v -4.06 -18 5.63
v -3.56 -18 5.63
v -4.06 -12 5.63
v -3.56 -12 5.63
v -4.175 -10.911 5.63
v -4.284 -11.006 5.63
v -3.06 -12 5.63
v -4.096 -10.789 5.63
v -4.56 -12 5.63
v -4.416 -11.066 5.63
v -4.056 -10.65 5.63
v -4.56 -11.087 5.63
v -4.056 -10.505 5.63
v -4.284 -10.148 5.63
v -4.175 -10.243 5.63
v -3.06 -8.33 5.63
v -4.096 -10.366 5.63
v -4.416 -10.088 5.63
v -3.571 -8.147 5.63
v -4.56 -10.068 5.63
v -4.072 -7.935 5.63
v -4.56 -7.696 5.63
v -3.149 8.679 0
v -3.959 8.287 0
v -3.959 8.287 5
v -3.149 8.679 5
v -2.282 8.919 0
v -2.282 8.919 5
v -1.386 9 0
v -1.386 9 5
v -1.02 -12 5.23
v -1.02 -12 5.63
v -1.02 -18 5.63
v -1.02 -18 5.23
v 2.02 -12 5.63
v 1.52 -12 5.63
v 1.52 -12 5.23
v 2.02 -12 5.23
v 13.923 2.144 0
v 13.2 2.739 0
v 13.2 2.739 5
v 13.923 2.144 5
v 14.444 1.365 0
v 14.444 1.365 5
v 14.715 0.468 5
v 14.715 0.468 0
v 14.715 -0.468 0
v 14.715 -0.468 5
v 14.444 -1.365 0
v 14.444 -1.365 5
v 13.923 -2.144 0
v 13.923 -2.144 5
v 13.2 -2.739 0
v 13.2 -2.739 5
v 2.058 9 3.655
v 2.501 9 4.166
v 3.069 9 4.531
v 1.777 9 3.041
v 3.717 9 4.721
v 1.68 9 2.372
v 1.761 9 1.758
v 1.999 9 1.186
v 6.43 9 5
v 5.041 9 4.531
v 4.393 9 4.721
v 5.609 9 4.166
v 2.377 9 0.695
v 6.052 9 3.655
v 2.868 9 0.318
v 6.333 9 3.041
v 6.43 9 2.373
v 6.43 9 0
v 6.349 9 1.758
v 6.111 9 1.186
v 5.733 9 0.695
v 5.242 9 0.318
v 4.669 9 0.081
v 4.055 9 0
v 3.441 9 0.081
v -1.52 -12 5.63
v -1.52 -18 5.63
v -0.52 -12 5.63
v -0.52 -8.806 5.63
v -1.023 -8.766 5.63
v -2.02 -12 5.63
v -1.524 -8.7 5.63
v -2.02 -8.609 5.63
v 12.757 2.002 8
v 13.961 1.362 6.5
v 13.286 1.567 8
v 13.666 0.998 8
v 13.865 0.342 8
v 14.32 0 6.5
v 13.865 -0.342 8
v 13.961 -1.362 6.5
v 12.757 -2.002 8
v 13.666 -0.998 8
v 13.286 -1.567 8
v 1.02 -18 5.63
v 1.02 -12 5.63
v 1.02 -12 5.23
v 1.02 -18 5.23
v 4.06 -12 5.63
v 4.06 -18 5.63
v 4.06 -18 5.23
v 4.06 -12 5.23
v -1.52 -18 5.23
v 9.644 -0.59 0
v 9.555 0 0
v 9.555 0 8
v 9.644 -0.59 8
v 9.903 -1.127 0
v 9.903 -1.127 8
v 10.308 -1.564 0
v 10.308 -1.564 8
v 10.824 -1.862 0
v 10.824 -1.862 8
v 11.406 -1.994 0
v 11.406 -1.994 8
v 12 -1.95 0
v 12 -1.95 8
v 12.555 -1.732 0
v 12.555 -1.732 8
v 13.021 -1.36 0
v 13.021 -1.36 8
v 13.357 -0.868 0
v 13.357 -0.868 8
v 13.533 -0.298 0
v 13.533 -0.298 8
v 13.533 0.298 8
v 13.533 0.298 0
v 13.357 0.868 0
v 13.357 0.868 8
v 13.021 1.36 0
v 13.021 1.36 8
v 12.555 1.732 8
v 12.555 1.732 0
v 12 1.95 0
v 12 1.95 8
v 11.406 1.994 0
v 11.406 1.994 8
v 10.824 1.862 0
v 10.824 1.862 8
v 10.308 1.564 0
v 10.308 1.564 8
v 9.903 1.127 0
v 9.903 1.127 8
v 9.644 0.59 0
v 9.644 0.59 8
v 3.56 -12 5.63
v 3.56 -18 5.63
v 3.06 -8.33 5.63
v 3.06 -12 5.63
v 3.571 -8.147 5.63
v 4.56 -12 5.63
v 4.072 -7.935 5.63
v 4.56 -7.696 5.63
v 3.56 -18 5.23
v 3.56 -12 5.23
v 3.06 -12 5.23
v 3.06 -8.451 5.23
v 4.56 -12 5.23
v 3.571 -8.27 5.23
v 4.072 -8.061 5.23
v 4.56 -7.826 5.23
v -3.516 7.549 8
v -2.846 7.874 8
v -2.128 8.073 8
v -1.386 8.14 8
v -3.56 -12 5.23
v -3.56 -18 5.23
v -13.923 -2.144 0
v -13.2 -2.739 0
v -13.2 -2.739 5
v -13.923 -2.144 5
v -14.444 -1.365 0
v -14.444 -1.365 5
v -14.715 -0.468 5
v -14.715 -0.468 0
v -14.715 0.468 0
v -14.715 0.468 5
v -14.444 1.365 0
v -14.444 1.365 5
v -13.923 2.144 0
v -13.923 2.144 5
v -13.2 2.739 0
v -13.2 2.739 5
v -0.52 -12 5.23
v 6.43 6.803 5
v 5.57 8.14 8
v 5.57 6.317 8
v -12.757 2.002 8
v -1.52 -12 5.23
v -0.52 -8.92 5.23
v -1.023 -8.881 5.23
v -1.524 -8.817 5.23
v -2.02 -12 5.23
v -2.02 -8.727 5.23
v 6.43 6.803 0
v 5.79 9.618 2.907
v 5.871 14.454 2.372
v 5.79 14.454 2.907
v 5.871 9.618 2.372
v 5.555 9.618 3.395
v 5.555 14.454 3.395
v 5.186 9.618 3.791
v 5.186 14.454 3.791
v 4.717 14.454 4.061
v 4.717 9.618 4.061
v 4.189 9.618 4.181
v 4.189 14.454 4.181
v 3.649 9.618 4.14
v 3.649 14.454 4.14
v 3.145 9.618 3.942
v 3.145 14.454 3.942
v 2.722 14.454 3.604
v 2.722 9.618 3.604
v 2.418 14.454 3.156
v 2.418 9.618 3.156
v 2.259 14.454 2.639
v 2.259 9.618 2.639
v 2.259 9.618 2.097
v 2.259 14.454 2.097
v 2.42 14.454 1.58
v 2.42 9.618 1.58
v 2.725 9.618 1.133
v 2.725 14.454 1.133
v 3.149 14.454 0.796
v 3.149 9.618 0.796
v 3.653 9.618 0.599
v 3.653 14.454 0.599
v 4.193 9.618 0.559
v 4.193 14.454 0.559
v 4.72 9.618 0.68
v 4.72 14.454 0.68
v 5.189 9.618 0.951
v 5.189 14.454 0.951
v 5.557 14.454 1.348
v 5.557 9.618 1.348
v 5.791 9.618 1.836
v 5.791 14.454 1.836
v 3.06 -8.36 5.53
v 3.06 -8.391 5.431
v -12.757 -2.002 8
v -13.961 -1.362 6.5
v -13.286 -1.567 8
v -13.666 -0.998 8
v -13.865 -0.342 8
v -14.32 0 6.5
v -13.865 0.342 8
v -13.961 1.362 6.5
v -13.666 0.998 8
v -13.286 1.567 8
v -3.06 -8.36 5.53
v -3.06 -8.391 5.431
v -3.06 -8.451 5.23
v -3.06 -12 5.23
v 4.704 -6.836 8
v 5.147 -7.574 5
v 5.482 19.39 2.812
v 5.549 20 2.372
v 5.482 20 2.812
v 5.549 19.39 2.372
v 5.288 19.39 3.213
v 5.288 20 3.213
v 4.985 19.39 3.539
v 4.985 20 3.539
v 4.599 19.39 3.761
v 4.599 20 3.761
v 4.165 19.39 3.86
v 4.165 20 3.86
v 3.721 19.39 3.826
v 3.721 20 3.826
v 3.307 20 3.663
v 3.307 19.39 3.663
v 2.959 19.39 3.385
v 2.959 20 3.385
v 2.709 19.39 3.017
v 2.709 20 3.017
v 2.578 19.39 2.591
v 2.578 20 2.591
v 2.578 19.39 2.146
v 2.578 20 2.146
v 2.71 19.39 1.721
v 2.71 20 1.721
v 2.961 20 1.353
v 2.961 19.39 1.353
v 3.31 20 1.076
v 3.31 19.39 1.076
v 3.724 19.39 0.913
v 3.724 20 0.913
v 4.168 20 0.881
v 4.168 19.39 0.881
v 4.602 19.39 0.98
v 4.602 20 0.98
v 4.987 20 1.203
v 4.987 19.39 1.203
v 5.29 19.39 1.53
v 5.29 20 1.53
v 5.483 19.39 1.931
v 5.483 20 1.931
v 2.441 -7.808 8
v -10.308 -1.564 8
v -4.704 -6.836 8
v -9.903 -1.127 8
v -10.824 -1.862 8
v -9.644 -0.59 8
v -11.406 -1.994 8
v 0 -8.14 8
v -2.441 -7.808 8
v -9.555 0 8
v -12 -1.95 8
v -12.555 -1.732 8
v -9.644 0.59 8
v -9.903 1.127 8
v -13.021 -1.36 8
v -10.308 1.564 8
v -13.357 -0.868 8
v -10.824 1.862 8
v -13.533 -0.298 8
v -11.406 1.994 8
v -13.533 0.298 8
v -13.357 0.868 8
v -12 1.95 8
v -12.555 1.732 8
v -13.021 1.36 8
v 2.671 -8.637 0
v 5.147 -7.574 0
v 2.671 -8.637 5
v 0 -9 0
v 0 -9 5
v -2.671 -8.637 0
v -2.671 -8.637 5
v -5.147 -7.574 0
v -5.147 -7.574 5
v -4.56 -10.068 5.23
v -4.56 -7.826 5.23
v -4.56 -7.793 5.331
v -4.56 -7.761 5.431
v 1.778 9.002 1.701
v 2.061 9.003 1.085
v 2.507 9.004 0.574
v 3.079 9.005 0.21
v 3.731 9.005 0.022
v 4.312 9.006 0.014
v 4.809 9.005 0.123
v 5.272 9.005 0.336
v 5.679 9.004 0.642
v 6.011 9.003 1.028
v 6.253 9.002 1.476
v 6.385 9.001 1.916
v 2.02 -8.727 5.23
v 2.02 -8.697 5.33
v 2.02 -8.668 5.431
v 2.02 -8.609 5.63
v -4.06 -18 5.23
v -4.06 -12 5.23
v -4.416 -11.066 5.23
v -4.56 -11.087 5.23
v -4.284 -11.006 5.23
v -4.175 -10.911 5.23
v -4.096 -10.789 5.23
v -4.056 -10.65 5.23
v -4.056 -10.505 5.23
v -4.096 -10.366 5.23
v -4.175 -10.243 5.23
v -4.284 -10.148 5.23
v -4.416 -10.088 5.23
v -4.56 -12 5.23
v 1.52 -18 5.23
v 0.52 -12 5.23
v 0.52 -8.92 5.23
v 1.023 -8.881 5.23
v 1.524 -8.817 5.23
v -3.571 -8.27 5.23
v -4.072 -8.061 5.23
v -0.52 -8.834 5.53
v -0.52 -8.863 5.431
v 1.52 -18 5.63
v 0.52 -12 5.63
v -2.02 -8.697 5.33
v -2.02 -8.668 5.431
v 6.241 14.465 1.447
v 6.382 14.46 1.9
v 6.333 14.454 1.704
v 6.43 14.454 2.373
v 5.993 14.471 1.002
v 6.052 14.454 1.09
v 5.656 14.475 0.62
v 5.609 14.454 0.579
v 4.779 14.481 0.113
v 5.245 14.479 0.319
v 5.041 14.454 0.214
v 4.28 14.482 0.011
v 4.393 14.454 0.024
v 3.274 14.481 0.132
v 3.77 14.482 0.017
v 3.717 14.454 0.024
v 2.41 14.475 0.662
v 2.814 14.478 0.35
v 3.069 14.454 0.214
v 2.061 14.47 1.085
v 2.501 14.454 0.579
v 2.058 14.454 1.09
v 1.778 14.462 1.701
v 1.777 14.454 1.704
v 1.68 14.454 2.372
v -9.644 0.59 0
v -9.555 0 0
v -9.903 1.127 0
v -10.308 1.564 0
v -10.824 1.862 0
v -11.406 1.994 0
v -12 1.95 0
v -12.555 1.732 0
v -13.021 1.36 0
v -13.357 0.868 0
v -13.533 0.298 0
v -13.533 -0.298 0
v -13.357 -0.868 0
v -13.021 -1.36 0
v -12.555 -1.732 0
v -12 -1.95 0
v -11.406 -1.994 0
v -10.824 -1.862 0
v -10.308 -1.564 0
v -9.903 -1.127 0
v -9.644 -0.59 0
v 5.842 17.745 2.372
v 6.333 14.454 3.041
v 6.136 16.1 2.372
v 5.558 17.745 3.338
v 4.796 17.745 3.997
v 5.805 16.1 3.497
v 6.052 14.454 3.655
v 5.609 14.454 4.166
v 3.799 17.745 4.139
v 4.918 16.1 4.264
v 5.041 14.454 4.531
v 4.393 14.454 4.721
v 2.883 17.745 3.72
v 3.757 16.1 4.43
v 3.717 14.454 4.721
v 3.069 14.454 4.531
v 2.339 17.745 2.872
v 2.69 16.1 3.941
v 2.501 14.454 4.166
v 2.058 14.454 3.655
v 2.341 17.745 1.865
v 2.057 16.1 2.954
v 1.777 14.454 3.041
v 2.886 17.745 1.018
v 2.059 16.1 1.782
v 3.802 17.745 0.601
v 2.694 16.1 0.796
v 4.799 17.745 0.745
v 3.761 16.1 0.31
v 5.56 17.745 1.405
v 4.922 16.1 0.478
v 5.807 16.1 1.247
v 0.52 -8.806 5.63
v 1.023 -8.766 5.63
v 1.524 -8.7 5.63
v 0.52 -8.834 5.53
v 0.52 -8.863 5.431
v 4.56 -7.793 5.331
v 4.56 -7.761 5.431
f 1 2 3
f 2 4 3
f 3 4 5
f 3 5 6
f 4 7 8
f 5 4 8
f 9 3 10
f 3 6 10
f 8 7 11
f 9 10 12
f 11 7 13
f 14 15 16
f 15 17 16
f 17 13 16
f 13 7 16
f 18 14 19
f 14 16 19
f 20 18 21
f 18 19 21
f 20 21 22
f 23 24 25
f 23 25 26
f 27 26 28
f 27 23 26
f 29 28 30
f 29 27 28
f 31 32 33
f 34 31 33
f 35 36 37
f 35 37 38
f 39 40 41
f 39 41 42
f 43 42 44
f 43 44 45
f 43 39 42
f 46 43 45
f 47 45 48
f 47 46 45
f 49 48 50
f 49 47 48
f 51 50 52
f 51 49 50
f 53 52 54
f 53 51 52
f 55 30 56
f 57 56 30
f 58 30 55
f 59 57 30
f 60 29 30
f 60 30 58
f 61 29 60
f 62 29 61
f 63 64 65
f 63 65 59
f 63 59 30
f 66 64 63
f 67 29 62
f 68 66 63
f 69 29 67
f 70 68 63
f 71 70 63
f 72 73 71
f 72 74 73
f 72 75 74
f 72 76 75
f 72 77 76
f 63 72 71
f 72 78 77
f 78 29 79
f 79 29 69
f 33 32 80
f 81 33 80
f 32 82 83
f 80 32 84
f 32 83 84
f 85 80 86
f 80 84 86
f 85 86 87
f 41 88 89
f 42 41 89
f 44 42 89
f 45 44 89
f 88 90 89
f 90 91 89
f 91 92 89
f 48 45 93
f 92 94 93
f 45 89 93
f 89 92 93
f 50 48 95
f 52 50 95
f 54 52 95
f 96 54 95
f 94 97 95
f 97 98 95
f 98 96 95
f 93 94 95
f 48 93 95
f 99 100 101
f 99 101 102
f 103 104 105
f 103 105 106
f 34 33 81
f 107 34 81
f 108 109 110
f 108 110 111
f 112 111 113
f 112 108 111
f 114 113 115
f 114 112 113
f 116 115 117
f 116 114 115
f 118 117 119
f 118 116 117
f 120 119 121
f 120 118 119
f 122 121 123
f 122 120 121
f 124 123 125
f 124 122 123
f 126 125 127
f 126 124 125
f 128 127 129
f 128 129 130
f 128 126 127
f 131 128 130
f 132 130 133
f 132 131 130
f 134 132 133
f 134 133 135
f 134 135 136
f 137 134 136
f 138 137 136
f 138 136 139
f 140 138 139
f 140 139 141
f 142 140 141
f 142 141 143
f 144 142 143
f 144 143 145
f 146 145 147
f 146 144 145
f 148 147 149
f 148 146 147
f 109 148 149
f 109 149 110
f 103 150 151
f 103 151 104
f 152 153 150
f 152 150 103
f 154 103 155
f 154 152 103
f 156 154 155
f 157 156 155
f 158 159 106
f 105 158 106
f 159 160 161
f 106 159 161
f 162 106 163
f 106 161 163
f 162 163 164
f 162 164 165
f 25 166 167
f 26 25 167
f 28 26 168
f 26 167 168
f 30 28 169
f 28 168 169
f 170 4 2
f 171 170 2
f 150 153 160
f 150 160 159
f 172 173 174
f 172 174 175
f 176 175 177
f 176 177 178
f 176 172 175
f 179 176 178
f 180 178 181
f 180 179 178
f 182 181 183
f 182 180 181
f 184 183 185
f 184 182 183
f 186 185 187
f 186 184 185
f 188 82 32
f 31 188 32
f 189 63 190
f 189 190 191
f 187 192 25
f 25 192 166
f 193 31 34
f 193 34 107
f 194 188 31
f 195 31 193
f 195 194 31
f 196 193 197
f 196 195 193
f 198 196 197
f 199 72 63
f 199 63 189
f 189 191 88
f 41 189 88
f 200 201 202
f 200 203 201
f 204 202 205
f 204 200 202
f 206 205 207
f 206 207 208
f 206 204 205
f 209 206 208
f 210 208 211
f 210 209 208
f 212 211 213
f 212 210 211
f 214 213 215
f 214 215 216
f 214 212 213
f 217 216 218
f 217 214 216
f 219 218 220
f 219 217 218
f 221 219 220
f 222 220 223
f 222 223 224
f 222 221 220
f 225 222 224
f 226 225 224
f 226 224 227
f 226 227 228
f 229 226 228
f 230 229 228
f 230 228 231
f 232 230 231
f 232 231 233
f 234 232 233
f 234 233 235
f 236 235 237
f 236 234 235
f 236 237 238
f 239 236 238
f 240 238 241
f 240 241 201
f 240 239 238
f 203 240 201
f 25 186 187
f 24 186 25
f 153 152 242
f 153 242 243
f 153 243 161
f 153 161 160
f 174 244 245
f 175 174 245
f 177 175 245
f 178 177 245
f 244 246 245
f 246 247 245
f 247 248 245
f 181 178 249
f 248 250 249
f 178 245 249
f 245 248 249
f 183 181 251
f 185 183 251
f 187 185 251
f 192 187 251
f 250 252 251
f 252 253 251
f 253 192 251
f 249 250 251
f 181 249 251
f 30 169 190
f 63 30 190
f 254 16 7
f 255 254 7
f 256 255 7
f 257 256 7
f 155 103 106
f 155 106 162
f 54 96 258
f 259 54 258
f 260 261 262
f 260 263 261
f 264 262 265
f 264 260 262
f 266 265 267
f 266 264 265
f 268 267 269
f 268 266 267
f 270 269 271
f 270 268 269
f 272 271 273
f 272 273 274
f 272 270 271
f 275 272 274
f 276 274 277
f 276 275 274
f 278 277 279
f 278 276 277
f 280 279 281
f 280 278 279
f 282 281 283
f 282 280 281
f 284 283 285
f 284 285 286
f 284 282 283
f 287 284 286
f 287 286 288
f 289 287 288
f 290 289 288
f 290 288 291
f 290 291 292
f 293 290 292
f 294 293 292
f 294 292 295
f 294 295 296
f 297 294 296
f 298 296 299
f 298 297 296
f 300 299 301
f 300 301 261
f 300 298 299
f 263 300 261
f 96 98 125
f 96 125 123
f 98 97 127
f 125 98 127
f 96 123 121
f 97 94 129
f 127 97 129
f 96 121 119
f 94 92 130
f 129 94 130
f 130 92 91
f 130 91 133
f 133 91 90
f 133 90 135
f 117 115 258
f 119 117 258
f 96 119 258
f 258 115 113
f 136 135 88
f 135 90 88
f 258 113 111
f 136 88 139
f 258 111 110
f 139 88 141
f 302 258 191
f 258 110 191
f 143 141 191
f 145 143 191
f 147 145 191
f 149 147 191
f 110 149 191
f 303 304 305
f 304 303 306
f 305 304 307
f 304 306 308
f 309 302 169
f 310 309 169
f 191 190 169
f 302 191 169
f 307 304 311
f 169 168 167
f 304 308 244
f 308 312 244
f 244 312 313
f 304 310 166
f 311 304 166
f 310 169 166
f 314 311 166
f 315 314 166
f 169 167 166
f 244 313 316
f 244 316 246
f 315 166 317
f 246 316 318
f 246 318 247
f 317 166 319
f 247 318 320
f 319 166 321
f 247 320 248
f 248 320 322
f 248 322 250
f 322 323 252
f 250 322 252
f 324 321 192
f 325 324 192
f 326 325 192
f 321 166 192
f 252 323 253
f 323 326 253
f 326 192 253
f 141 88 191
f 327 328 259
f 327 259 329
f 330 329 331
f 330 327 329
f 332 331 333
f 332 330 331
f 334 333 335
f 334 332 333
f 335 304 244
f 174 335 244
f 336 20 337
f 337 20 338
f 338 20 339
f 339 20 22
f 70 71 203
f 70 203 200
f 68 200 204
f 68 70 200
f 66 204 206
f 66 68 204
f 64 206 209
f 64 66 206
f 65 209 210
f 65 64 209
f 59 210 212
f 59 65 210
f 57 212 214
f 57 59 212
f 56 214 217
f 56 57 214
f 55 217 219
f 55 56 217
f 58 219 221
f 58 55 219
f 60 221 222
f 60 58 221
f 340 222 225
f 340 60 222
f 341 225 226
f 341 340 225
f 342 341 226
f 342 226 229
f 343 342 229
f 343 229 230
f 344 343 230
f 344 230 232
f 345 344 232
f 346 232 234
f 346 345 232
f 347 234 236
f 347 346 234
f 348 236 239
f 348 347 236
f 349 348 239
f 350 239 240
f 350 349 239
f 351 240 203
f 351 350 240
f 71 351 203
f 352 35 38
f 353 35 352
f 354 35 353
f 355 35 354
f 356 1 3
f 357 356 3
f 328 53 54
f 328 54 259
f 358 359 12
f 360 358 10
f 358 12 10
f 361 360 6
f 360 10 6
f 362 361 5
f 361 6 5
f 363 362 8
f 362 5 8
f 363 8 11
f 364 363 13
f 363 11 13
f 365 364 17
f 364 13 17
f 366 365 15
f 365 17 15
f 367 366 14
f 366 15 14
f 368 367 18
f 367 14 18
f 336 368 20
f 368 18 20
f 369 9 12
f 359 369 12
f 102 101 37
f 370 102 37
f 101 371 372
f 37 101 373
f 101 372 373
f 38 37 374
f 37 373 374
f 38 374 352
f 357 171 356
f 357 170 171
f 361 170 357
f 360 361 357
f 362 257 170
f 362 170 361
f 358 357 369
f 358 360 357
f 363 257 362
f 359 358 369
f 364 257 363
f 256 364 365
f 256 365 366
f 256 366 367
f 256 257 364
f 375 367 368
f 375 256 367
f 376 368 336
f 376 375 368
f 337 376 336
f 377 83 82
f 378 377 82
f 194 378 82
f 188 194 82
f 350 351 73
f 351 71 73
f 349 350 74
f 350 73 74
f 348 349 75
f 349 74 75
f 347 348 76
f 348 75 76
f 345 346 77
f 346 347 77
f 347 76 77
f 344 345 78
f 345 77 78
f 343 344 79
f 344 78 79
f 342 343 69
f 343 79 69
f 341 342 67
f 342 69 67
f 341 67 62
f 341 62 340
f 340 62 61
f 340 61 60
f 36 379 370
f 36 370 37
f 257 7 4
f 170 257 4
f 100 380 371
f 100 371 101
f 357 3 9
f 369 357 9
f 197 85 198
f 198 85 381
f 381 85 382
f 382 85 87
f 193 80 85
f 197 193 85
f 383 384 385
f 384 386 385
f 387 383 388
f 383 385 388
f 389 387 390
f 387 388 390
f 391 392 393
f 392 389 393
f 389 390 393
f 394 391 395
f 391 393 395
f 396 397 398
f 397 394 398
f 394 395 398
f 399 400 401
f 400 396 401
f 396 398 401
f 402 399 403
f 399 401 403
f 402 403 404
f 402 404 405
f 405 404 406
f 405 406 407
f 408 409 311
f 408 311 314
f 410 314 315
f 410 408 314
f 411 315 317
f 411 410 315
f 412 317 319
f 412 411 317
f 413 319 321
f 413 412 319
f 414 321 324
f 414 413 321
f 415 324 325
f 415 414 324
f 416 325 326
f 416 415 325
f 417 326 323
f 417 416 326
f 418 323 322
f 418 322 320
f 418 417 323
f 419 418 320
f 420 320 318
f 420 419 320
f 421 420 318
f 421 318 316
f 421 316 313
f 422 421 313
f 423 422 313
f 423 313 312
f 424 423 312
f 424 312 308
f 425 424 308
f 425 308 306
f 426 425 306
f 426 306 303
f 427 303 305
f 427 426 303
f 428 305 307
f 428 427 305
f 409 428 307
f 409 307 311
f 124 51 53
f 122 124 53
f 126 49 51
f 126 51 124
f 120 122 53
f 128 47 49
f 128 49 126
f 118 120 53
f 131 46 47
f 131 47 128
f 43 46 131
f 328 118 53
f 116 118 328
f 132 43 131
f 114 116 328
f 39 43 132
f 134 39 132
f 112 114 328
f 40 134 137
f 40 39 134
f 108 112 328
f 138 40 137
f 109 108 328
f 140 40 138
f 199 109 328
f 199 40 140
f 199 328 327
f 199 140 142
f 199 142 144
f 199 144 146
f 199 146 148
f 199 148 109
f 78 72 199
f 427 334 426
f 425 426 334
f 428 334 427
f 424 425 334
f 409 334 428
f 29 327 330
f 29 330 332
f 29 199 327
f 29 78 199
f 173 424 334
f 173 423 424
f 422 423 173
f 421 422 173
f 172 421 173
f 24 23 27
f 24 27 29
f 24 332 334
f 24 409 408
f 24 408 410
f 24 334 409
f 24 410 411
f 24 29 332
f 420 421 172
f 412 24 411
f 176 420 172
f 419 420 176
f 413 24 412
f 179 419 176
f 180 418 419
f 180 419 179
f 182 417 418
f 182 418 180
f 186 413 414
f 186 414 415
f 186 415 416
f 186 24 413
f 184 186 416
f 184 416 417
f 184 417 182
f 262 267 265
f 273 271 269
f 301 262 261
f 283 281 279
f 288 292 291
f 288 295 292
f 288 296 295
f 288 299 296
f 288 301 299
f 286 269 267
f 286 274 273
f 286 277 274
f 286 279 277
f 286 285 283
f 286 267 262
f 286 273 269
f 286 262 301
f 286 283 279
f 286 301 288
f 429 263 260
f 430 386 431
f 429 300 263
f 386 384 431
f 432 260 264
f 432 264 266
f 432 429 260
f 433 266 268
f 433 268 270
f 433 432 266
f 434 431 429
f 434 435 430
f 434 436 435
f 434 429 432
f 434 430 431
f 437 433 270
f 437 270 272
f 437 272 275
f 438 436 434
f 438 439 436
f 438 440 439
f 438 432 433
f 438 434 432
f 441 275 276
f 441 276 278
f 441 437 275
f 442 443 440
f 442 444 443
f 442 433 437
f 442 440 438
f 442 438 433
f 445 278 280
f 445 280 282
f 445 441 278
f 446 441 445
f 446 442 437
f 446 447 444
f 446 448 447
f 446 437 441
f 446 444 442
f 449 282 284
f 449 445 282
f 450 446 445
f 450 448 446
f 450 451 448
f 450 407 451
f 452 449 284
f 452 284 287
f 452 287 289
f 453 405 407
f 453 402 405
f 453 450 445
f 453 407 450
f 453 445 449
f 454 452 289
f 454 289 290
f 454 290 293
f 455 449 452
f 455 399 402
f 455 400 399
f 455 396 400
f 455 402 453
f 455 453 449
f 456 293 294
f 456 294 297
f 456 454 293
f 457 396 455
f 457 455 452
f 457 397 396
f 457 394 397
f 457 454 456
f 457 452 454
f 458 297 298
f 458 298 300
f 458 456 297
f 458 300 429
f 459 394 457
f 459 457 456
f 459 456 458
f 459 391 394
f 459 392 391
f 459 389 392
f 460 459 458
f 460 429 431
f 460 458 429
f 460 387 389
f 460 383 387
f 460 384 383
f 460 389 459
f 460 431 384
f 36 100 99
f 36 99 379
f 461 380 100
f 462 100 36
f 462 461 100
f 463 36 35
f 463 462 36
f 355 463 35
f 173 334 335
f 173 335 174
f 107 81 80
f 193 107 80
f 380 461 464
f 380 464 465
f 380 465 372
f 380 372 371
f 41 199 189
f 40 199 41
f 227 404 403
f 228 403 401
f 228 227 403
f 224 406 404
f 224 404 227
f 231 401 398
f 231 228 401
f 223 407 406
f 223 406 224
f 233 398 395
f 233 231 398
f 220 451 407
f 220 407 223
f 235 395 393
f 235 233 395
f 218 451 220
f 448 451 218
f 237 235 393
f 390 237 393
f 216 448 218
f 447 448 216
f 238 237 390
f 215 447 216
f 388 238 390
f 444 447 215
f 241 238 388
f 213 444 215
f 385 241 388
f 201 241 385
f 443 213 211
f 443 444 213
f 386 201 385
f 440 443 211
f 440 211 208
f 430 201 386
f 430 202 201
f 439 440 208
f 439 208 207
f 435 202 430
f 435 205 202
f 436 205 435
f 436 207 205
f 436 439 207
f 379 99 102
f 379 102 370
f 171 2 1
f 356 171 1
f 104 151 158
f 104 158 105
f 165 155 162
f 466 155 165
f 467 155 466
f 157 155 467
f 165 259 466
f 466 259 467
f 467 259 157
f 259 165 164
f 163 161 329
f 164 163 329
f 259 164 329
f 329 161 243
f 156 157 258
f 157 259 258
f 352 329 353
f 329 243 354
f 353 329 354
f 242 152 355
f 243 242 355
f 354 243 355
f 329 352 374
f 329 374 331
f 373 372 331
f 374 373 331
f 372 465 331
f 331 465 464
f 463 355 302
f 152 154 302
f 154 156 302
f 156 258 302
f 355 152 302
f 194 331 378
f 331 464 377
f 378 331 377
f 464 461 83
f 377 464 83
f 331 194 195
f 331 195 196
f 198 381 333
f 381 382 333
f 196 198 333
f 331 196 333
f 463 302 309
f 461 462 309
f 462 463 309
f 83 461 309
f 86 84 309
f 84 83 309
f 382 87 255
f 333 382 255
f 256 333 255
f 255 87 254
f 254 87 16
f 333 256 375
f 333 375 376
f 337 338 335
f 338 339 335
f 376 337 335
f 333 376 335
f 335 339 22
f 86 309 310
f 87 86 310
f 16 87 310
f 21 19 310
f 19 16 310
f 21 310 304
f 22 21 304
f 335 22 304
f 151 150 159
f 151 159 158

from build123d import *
from OCP.BRepFilletAPI import BRepFilletAPI_MakeChamfer

# Parameters (mm, degrees)
SKIZZE1_R                       = 2
AUFSATZ_LINEAR_AUSTRAGEN1_DEPTH = 8
SKIZZE2_R                       = 2.375
AUFSATZ_LINEAR_AUSTRAGEN2_DEPTH = 11
FASE1_SIZE                      = 3
FASE1_SIZE2                     = 0.860236157
AUFSATZ_LINEAR_AUSTRAGEN3_DEPTH = 0.4
SKIZZE5_R                       = 0.509593562
SCHNITT_LINEAR_AUSTRAGEN1_DEPTH = 26.48056909


with BuildPart() as part:
    # Skizze1 → Aufsatz-Linear austragen1 (new body)
    with BuildSketch(Plane.XY):
        with BuildLine():
            Line((-13.199545584, 2.739250778), (-3.959262527, 8.28677743))
            ThreePointArc((-3.959262527, 8.28677743), (-2.720950124, 8.81839637), (-1.385638765, 9))
            Line((-1.385638765, 9), (0, 9))
            Line((0, 9), (2.77127753, 9))
            Line((2.77127753, 9), (6.43, 9))
            Line((6.43, 9), (6.43, 6.803437374))
            Line((6.43, 6.803437374), (13.199545584, 2.739250778))
            ThreePointArc((13.199545584, 2.739250778), (14.75, 0), (13.199545584, -2.739250778))
            Line((13.199545584, -2.739250778), (5.147247524, -7.573554859))
            ThreePointArc((5.147247524, -7.573554859), (0, -9), (-5.147247524, -7.573554859))
            Line((-5.147247524, -7.573554859), (-13.199545584, -2.739250778))
            ThreePointArc((-13.199545584, -2.739250778), (-14.75, 0), (-13.199545584, 2.739250778))
        make_face()
        with Locations((-11.555, 0)):
            Circle(SKIZZE1_R, mode=Mode.SUBTRACT)
        with Locations(Location((11.555, 0, 0), (0, 0, 180))):
            Circle(SKIZZE1_R, mode=Mode.SUBTRACT)
    extrude(amount=AUFSATZ_LINEAR_AUSTRAGEN1_DEPTH)

    # Skizze2 → Aufsatz-Linear austragen2 (add)
    with BuildSketch(Plane(origin=(0, 9, 0), x_dir=(1, 0, 0), z_dir=(0, 1, 0))):
        with Locations(Location((4.055, -2.375, 0), (0, 0, 90))):
            Circle(SKIZZE2_R)
    extrude(amount=AUFSATZ_LINEAR_AUSTRAGEN2_DEPTH)

    # Skizze3 → Schnitt-Rotation5 (revolve, cut)
    with BuildSketch(Plane(origin=(0, 0, 2.37), x_dir=(-1, 0, 0), z_dir=(0, 0, -1)), mode=Mode.PRIVATE) as schnitt_rotation5_sk:
        Polygon((-5.548619779, 20), (-5.548619779, 19.390425007), (-6.43, 14.45438156), (-5.871186885, 14.45438156), (-5.871186885, 9.618429672), (-6.43, 9), (-7.295904823, 9), (-6.993468517, 15.795841506), (-6.993468517, 20), align=None)
    revolve(schnitt_rotation5_sk.sketch.rotate(Axis((4.055, 22.337602527, 2.37), (0, -1, 0)), 0.060311358), axis=Axis((4.055, 22.337602527, 2.37), (0, -1, 0)), mode=Mode.SUBTRACT)

    # Fase1: one chamfer whose edges measure the first distance from different faces: ONE call of the kernel's chamfer builder (chamfer() names one face for all edges)
    fase1_edges_1 = [part.edges().sort_by_distance(p)[0] for p in [
        (14.75, 0, 8),
    ]]
    fase1_side_1 = [part.faces().sort_by_distance(p)[0] for p in [
        (14.75, 0, 4),
    ]]
    fase1_edges_2 = [part.edges().sort_by_distance(p)[0] for p in [
        (9.814772792, 4.771344076, 8),
    ]]
    fase1_side_2 = [part.faces().sort_by_distance(p)[0] for p in [
        (9.814772792, 4.771344076, 4),
    ]]
    fase1_edges_3 = [part.edges().sort_by_distance(p)[0] for p in [
        (6.43, 7.901718687, 8),
    ]]
    fase1_side_3 = [part.faces().sort_by_distance(p)[0] for p in [
        (6.43, 7.901718687, 4),
    ]]
    fase1_edges_4 = [part.edges().sort_by_distance(p)[0] for p in [
        (2.522180617, 9, 8),
    ]]
    fase1_side_4 = [part.faces().sort_by_distance(p)[0] for p in [
        (1.917072159, 9, 4.642485362),
    ]]
    fase1_edges_5 = [part.edges().sort_by_distance(p)[0] for p in [
        (-2.720950124, 8.81839637, 8),
    ]]
    fase1_side_5 = [part.faces().sort_by_distance(p)[0] for p in [
        (-2.720950124, 8.81839637, 4),
    ]]
    fase1_edges_6 = [part.edges().sort_by_distance(p)[0] for p in [
        (-8.579404056, 5.513014104, 8),
    ]]
    fase1_side_6 = [part.faces().sort_by_distance(p)[0] for p in [
        (-8.579404056, 5.513014104, 4),
    ]]
    fase1_edges_7 = [part.edges().sort_by_distance(p)[0] for p in [
        (-14.75, 0, 8),
    ]]
    fase1_side_7 = [part.faces().sort_by_distance(p)[0] for p in [
        (-14.75, 0, 4),
    ]]
    fase1_edges_8 = [part.edges().sort_by_distance(p)[0] for p in [
        (-9.173396554, -5.156402818, 8),
    ]]
    fase1_side_8 = [part.faces().sort_by_distance(p)[0] for p in [
        (-9.173396554, -5.156402818, 4),
    ]]
    fase1_edges_9 = [part.edges().sort_by_distance(p)[0] for p in [
        (0, -9, 8),
    ]]
    fase1_side_9 = [part.faces().sort_by_distance(p)[0] for p in [
        (0, -9, 4),
    ]]
    fase1_edges_10 = [part.edges().sort_by_distance(p)[0] for p in [
        (9.173396554, -5.156402818, 8),
    ]]
    fase1_side_10 = [part.faces().sort_by_distance(p)[0] for p in [
        (9.173396554, -5.156402818, 4),
    ]]
    fase1 = BRepFilletAPI_MakeChamfer(part.part.solid().wrapped)
    for e in fase1_edges_1:
        fase1.Add(FASE1_SIZE, FASE1_SIZE2, e.wrapped, fase1_side_1[0].wrapped)  # the first distance lies on this face
    for e in fase1_edges_2:
        fase1.Add(FASE1_SIZE, FASE1_SIZE2, e.wrapped, fase1_side_2[0].wrapped)  # the first distance lies on this face
    for e in fase1_edges_3:
        fase1.Add(FASE1_SIZE, FASE1_SIZE2, e.wrapped, fase1_side_3[0].wrapped)  # the first distance lies on this face
    for e in fase1_edges_4:
        fase1.Add(FASE1_SIZE, FASE1_SIZE2, e.wrapped, fase1_side_4[0].wrapped)  # the first distance lies on this face
    for e in fase1_edges_5:
        fase1.Add(FASE1_SIZE, FASE1_SIZE2, e.wrapped, fase1_side_5[0].wrapped)  # the first distance lies on this face
    for e in fase1_edges_6:
        fase1.Add(FASE1_SIZE, FASE1_SIZE2, e.wrapped, fase1_side_6[0].wrapped)  # the first distance lies on this face
    for e in fase1_edges_7:
        fase1.Add(FASE1_SIZE, FASE1_SIZE2, e.wrapped, fase1_side_7[0].wrapped)  # the first distance lies on this face
    for e in fase1_edges_8:
        fase1.Add(FASE1_SIZE, FASE1_SIZE2, e.wrapped, fase1_side_8[0].wrapped)  # the first distance lies on this face
    for e in fase1_edges_9:
        fase1.Add(FASE1_SIZE, FASE1_SIZE2, e.wrapped, fase1_side_9[0].wrapped)  # the first distance lies on this face
    for e in fase1_edges_10:
        fase1.Add(FASE1_SIZE, FASE1_SIZE2, e.wrapped, fase1_side_10[0].wrapped)  # the first distance lies on this face
    add(Compound.cast(fase1.Shape()), mode=Mode.REPLACE)

    # Skizze4 → Aufsatz-Linear austragen3 (add)
    with BuildSketch(Plane.XY.offset(5.63)):
        Polygon((-1.52, -12), (-2.02, -12), (-2.02, -5), (-0.52, -5), (-0.52, -12), (-1.02, -12), (-1.02, -18), (-1.52, -18), align=None)
        Polygon((-4.06, -12), (-4.56, -12), (-4.56, -5), (-3.06, -5), (-3.06, -12), (-3.56, -12), (-3.56, -18), (-4.06, -18), align=None)
        Polygon((3.56, -12), (3.56, -18), (4.06, -18), (4.06, -12), (4.56, -12), (4.56, -5), (3.06, -5), (3.06, -12), align=None)
        Polygon((1.02, -12), (1.02, -18), (1.52, -18), (1.52, -12), (2.02, -12), (2.02, -5), (0.52, -5), (0.52, -12), align=None)
    extrude(amount=-AUFSATZ_LINEAR_AUSTRAGEN3_DEPTH)

    # Skizze5 → Schnitt-Linear austragen1 (cut, through all)
    with BuildSketch(Plane.XY.offset(5.63)):
        with Locations((-4.56, -10.577193371)):
            Circle(SKIZZE5_R)
    extrude(amount=-SCHNITT_LINEAR_AUSTRAGEN1_DEPTH, mode=Mode.SUBTRACT)


solid = part.part
